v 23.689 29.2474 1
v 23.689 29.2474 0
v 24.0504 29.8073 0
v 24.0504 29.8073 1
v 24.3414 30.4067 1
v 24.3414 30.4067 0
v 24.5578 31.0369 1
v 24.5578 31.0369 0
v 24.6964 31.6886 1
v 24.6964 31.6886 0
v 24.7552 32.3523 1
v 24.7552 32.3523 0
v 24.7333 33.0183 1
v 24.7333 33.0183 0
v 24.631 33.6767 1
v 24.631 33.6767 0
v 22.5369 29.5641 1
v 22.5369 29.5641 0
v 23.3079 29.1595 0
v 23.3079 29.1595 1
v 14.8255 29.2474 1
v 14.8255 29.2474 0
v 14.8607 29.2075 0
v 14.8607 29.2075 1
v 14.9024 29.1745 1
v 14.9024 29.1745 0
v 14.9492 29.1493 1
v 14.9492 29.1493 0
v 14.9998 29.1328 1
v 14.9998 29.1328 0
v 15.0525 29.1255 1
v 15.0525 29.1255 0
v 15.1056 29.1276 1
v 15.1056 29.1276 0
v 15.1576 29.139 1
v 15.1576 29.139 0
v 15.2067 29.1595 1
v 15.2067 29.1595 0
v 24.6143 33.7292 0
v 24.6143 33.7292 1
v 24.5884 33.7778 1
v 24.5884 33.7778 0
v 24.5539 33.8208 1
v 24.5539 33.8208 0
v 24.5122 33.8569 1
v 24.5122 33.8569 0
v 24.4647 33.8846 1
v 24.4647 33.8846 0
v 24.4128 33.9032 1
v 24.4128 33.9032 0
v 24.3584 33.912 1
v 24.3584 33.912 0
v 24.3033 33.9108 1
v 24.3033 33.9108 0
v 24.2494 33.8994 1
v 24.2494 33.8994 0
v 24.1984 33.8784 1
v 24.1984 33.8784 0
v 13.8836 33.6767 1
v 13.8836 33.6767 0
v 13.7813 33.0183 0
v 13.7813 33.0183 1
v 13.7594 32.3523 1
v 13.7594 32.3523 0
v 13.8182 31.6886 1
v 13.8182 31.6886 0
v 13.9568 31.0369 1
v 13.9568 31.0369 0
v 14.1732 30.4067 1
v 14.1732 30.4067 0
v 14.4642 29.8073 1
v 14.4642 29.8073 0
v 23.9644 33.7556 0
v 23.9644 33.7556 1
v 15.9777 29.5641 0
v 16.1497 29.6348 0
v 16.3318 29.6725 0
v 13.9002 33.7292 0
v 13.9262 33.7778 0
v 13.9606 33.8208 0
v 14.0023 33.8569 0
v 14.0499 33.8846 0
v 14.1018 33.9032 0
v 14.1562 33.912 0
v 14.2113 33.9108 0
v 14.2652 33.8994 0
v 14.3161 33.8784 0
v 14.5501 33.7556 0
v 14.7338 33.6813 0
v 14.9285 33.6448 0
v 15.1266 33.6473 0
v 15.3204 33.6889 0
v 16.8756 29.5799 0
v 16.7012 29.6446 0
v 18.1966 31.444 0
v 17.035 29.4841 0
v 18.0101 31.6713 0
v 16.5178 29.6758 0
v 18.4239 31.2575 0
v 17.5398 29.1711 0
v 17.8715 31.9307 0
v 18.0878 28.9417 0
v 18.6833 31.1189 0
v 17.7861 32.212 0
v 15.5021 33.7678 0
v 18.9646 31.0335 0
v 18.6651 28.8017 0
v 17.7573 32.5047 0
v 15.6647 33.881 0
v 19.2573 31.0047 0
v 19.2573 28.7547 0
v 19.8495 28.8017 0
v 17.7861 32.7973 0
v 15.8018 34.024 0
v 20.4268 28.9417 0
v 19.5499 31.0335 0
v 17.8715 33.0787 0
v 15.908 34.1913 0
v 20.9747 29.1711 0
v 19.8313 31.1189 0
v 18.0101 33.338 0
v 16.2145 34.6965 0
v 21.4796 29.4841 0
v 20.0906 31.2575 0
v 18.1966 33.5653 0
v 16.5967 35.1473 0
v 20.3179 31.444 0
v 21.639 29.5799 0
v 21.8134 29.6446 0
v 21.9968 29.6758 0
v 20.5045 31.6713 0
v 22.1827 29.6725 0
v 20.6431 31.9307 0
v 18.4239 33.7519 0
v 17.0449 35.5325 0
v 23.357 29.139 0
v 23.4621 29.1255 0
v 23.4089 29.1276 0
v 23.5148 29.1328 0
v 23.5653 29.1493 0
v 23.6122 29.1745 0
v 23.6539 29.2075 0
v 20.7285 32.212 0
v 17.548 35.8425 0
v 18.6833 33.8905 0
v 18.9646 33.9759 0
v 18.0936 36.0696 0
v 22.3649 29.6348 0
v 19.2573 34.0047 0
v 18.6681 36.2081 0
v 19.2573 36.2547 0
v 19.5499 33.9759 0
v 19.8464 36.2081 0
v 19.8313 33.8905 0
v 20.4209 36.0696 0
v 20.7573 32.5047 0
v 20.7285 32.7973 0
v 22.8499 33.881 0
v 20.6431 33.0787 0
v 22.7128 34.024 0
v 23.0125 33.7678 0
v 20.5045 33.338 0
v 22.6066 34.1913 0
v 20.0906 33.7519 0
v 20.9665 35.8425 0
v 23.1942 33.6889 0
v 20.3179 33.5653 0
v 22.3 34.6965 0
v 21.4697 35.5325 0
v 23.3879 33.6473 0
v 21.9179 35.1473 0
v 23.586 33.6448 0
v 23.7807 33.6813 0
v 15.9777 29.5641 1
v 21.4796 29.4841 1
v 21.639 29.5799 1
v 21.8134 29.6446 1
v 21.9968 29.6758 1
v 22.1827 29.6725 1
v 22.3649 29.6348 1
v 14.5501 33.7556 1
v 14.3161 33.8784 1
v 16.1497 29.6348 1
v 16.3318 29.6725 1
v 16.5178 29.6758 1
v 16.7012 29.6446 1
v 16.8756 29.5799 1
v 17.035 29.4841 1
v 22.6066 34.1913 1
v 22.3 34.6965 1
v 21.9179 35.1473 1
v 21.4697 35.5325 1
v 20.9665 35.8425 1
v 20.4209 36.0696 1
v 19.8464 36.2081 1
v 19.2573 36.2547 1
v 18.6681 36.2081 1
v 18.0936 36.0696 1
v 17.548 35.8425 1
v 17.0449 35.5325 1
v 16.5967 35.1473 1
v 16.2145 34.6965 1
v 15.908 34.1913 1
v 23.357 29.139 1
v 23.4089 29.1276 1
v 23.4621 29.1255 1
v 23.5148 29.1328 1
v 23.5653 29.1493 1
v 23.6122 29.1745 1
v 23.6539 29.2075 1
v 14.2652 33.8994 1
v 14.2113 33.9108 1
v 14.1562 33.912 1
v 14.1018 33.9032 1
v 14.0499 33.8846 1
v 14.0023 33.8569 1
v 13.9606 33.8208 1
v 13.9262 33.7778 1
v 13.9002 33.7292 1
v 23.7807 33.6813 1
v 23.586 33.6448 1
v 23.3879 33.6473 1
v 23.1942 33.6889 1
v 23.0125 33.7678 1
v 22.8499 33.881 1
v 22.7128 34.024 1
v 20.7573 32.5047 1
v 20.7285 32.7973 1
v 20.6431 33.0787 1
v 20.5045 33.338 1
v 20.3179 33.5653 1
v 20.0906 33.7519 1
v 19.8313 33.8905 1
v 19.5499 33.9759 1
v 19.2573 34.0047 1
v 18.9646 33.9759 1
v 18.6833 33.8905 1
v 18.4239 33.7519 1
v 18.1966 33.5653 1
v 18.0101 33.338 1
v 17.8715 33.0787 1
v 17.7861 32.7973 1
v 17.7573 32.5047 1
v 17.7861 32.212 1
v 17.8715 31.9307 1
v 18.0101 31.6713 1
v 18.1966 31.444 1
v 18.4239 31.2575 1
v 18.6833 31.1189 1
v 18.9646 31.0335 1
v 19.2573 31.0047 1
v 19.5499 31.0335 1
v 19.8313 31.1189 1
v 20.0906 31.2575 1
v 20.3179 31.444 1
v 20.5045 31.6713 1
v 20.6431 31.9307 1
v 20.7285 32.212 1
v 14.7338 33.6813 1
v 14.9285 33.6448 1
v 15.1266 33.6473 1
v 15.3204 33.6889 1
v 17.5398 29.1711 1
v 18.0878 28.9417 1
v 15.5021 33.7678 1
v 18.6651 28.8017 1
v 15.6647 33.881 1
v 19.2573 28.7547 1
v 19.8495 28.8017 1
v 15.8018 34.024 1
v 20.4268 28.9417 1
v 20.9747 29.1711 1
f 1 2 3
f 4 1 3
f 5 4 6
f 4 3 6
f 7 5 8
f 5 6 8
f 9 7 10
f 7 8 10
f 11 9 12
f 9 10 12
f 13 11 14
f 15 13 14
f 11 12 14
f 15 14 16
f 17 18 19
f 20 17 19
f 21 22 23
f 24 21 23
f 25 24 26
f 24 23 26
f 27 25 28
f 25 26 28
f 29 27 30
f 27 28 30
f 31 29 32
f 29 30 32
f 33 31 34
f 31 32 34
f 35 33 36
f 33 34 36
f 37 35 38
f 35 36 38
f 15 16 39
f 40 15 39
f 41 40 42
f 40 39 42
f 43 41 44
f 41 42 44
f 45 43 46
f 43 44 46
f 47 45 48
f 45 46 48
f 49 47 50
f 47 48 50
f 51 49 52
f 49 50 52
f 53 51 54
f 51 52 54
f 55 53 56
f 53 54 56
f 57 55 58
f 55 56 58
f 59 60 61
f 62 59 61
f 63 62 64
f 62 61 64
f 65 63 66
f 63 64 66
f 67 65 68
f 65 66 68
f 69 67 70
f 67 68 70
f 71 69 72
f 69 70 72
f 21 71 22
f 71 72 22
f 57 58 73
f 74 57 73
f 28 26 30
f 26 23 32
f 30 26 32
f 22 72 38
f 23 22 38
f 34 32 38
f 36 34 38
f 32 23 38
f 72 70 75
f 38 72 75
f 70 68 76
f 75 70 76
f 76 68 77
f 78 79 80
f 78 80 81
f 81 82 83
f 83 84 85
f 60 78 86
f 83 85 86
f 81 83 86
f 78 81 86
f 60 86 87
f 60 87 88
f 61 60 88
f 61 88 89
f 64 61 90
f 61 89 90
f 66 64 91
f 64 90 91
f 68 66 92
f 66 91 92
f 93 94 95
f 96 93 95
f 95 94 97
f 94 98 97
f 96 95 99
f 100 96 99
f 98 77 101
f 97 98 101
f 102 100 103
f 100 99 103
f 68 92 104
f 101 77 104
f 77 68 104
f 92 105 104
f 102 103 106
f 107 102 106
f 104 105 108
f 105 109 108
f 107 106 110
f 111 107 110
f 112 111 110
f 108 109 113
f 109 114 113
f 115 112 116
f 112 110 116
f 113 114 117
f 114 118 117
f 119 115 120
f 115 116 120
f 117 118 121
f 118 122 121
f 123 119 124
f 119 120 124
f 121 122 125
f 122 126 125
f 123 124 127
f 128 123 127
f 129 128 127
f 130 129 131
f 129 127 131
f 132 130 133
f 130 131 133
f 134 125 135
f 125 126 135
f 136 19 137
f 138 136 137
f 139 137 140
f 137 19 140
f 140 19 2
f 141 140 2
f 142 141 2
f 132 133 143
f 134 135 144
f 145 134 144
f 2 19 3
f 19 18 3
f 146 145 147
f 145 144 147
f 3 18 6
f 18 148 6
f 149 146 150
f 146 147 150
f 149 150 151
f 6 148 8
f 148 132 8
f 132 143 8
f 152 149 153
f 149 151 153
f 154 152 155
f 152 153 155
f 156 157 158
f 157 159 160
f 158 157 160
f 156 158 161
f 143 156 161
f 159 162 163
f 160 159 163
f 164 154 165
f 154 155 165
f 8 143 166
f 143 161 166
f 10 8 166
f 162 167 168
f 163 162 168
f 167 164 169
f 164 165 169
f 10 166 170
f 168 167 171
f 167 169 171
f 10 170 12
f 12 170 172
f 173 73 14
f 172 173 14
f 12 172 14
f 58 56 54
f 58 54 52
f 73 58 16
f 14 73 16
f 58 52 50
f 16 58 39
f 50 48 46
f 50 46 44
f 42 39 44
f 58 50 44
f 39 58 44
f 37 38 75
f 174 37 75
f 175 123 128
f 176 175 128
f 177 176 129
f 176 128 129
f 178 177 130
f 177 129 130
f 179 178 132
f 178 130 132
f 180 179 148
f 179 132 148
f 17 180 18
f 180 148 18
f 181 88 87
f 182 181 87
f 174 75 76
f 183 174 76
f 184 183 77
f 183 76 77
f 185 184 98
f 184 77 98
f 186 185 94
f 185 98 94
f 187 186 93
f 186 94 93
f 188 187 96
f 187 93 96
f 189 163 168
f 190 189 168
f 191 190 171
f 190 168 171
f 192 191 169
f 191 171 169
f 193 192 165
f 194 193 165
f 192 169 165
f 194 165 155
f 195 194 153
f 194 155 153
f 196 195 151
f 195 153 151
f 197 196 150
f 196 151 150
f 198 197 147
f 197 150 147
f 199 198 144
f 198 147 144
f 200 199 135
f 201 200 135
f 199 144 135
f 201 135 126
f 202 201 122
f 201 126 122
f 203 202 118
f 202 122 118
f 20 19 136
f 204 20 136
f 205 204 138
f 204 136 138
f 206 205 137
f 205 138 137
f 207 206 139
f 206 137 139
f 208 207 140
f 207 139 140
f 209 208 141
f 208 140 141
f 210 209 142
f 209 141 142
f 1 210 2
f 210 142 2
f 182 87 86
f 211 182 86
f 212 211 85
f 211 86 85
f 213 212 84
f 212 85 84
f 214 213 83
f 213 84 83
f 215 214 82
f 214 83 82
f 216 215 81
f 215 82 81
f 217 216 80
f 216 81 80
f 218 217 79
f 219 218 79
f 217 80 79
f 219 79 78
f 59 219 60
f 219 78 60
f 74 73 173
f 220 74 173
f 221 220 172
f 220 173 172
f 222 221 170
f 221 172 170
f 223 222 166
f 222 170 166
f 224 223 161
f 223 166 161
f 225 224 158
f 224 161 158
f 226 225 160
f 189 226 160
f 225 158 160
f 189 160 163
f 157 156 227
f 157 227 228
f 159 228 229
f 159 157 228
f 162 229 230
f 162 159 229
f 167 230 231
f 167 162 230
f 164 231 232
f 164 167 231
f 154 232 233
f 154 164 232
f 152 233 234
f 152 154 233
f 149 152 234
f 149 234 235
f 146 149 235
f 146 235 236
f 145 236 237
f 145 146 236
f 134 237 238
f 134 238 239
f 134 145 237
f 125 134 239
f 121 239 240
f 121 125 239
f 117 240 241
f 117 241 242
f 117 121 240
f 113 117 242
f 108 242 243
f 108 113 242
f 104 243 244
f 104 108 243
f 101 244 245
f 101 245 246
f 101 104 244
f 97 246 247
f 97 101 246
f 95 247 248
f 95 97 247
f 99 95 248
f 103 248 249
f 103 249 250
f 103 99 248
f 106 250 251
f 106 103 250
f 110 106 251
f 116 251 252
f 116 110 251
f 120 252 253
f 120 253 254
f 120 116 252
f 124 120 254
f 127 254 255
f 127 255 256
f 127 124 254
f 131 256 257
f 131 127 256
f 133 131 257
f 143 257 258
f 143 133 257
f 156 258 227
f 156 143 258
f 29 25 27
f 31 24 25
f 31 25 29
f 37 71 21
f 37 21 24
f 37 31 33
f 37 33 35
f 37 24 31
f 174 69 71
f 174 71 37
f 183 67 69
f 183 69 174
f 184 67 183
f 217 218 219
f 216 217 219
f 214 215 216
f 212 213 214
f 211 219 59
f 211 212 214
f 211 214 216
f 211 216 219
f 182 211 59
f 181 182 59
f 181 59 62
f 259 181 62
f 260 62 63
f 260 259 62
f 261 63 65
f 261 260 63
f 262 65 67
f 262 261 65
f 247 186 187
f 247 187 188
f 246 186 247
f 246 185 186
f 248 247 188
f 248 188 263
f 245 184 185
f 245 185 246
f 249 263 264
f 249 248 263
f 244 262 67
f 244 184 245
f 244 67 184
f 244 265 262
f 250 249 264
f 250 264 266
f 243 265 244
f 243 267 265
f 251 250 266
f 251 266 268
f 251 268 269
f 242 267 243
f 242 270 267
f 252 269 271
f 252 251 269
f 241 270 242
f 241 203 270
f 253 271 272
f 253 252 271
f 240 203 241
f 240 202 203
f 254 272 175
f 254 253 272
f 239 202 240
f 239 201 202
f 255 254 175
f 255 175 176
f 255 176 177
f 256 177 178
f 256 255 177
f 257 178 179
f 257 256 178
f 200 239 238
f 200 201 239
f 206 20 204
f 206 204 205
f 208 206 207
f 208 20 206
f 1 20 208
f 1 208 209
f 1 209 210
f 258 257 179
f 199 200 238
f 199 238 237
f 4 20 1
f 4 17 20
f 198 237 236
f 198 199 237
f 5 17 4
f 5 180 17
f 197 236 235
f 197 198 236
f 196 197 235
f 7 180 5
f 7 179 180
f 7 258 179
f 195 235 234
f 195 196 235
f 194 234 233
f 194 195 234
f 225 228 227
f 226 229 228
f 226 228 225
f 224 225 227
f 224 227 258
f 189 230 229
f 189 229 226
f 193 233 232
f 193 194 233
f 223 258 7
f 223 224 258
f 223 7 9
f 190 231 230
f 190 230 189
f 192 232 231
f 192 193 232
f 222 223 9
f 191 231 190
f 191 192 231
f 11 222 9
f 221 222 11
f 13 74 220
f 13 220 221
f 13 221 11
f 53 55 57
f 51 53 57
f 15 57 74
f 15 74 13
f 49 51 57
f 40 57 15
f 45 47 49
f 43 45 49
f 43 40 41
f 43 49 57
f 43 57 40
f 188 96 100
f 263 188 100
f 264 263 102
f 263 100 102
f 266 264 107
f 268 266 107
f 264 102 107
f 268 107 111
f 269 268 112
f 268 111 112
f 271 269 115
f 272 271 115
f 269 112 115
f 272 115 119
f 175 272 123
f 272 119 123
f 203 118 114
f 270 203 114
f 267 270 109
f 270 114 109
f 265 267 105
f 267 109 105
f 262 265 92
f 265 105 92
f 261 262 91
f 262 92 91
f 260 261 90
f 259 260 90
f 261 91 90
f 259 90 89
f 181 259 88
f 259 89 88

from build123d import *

# Parameters (mm, degrees)
F0_R     = 1.5
F1_DEPTH = 1


with BuildPart() as f1:
    # F0 (on Top) → F1 (new body)
    with BuildSketch(Plane.XY):
        with BuildLine():
            ThreePointArc((14.316125, 33.878389), (14.049917, 33.884634), (13.883606, 33.676676))
            ThreePointArc((13.883606, 33.676676), (13.877587, 31.360626), (14.82553, 29.247447))
            ThreePointArc((14.82553, 29.247447), (14.999791, 29.1328), (15.206672, 29.159473))
            Line((15.206672, 29.159473), (15.977662, 29.564092))
            ThreePointArc((15.977662, 29.564092), (16.517793, 29.675774), (17.034976, 29.484108))
            ThreePointArc((17.034976, 29.484108), (19.257285, 28.754678), (21.479594, 29.484108))
            ThreePointArc((21.479594, 29.484108), (21.996777, 29.675774), (22.536907, 29.564092))
            Line((22.536907, 29.564092), (23.307898, 29.159473))
            ThreePointArc((23.307898, 29.159473), (23.514778, 29.1328), (23.689039, 29.247447))
            ThreePointArc((23.689039, 29.247447), (24.636982, 31.360626), (24.630963, 33.676676))
            ThreePointArc((24.630963, 33.676676), (24.464653, 33.884634), (24.198444, 33.878389))
            Line((24.198444, 33.878389), (23.964436, 33.755581))
            ThreePointArc((23.964436, 33.755581), (23.194202, 33.68887), (22.60659, 34.191288))
            ThreePointArc((22.60659, 34.191288), (19.257285, 36.254678), (15.907979, 34.191288))
            ThreePointArc((15.907979, 34.191288), (15.320368, 33.68887), (14.550133, 33.755581))
            Line((14.550133, 33.755581), (14.316125, 33.878389))
        make_face()
        with Locations((19.257285, 32.504678)):
            Circle(F0_R, mode=Mode.SUBTRACT)
    extrude(amount=F1_DEPTH)


solid = f1.part
